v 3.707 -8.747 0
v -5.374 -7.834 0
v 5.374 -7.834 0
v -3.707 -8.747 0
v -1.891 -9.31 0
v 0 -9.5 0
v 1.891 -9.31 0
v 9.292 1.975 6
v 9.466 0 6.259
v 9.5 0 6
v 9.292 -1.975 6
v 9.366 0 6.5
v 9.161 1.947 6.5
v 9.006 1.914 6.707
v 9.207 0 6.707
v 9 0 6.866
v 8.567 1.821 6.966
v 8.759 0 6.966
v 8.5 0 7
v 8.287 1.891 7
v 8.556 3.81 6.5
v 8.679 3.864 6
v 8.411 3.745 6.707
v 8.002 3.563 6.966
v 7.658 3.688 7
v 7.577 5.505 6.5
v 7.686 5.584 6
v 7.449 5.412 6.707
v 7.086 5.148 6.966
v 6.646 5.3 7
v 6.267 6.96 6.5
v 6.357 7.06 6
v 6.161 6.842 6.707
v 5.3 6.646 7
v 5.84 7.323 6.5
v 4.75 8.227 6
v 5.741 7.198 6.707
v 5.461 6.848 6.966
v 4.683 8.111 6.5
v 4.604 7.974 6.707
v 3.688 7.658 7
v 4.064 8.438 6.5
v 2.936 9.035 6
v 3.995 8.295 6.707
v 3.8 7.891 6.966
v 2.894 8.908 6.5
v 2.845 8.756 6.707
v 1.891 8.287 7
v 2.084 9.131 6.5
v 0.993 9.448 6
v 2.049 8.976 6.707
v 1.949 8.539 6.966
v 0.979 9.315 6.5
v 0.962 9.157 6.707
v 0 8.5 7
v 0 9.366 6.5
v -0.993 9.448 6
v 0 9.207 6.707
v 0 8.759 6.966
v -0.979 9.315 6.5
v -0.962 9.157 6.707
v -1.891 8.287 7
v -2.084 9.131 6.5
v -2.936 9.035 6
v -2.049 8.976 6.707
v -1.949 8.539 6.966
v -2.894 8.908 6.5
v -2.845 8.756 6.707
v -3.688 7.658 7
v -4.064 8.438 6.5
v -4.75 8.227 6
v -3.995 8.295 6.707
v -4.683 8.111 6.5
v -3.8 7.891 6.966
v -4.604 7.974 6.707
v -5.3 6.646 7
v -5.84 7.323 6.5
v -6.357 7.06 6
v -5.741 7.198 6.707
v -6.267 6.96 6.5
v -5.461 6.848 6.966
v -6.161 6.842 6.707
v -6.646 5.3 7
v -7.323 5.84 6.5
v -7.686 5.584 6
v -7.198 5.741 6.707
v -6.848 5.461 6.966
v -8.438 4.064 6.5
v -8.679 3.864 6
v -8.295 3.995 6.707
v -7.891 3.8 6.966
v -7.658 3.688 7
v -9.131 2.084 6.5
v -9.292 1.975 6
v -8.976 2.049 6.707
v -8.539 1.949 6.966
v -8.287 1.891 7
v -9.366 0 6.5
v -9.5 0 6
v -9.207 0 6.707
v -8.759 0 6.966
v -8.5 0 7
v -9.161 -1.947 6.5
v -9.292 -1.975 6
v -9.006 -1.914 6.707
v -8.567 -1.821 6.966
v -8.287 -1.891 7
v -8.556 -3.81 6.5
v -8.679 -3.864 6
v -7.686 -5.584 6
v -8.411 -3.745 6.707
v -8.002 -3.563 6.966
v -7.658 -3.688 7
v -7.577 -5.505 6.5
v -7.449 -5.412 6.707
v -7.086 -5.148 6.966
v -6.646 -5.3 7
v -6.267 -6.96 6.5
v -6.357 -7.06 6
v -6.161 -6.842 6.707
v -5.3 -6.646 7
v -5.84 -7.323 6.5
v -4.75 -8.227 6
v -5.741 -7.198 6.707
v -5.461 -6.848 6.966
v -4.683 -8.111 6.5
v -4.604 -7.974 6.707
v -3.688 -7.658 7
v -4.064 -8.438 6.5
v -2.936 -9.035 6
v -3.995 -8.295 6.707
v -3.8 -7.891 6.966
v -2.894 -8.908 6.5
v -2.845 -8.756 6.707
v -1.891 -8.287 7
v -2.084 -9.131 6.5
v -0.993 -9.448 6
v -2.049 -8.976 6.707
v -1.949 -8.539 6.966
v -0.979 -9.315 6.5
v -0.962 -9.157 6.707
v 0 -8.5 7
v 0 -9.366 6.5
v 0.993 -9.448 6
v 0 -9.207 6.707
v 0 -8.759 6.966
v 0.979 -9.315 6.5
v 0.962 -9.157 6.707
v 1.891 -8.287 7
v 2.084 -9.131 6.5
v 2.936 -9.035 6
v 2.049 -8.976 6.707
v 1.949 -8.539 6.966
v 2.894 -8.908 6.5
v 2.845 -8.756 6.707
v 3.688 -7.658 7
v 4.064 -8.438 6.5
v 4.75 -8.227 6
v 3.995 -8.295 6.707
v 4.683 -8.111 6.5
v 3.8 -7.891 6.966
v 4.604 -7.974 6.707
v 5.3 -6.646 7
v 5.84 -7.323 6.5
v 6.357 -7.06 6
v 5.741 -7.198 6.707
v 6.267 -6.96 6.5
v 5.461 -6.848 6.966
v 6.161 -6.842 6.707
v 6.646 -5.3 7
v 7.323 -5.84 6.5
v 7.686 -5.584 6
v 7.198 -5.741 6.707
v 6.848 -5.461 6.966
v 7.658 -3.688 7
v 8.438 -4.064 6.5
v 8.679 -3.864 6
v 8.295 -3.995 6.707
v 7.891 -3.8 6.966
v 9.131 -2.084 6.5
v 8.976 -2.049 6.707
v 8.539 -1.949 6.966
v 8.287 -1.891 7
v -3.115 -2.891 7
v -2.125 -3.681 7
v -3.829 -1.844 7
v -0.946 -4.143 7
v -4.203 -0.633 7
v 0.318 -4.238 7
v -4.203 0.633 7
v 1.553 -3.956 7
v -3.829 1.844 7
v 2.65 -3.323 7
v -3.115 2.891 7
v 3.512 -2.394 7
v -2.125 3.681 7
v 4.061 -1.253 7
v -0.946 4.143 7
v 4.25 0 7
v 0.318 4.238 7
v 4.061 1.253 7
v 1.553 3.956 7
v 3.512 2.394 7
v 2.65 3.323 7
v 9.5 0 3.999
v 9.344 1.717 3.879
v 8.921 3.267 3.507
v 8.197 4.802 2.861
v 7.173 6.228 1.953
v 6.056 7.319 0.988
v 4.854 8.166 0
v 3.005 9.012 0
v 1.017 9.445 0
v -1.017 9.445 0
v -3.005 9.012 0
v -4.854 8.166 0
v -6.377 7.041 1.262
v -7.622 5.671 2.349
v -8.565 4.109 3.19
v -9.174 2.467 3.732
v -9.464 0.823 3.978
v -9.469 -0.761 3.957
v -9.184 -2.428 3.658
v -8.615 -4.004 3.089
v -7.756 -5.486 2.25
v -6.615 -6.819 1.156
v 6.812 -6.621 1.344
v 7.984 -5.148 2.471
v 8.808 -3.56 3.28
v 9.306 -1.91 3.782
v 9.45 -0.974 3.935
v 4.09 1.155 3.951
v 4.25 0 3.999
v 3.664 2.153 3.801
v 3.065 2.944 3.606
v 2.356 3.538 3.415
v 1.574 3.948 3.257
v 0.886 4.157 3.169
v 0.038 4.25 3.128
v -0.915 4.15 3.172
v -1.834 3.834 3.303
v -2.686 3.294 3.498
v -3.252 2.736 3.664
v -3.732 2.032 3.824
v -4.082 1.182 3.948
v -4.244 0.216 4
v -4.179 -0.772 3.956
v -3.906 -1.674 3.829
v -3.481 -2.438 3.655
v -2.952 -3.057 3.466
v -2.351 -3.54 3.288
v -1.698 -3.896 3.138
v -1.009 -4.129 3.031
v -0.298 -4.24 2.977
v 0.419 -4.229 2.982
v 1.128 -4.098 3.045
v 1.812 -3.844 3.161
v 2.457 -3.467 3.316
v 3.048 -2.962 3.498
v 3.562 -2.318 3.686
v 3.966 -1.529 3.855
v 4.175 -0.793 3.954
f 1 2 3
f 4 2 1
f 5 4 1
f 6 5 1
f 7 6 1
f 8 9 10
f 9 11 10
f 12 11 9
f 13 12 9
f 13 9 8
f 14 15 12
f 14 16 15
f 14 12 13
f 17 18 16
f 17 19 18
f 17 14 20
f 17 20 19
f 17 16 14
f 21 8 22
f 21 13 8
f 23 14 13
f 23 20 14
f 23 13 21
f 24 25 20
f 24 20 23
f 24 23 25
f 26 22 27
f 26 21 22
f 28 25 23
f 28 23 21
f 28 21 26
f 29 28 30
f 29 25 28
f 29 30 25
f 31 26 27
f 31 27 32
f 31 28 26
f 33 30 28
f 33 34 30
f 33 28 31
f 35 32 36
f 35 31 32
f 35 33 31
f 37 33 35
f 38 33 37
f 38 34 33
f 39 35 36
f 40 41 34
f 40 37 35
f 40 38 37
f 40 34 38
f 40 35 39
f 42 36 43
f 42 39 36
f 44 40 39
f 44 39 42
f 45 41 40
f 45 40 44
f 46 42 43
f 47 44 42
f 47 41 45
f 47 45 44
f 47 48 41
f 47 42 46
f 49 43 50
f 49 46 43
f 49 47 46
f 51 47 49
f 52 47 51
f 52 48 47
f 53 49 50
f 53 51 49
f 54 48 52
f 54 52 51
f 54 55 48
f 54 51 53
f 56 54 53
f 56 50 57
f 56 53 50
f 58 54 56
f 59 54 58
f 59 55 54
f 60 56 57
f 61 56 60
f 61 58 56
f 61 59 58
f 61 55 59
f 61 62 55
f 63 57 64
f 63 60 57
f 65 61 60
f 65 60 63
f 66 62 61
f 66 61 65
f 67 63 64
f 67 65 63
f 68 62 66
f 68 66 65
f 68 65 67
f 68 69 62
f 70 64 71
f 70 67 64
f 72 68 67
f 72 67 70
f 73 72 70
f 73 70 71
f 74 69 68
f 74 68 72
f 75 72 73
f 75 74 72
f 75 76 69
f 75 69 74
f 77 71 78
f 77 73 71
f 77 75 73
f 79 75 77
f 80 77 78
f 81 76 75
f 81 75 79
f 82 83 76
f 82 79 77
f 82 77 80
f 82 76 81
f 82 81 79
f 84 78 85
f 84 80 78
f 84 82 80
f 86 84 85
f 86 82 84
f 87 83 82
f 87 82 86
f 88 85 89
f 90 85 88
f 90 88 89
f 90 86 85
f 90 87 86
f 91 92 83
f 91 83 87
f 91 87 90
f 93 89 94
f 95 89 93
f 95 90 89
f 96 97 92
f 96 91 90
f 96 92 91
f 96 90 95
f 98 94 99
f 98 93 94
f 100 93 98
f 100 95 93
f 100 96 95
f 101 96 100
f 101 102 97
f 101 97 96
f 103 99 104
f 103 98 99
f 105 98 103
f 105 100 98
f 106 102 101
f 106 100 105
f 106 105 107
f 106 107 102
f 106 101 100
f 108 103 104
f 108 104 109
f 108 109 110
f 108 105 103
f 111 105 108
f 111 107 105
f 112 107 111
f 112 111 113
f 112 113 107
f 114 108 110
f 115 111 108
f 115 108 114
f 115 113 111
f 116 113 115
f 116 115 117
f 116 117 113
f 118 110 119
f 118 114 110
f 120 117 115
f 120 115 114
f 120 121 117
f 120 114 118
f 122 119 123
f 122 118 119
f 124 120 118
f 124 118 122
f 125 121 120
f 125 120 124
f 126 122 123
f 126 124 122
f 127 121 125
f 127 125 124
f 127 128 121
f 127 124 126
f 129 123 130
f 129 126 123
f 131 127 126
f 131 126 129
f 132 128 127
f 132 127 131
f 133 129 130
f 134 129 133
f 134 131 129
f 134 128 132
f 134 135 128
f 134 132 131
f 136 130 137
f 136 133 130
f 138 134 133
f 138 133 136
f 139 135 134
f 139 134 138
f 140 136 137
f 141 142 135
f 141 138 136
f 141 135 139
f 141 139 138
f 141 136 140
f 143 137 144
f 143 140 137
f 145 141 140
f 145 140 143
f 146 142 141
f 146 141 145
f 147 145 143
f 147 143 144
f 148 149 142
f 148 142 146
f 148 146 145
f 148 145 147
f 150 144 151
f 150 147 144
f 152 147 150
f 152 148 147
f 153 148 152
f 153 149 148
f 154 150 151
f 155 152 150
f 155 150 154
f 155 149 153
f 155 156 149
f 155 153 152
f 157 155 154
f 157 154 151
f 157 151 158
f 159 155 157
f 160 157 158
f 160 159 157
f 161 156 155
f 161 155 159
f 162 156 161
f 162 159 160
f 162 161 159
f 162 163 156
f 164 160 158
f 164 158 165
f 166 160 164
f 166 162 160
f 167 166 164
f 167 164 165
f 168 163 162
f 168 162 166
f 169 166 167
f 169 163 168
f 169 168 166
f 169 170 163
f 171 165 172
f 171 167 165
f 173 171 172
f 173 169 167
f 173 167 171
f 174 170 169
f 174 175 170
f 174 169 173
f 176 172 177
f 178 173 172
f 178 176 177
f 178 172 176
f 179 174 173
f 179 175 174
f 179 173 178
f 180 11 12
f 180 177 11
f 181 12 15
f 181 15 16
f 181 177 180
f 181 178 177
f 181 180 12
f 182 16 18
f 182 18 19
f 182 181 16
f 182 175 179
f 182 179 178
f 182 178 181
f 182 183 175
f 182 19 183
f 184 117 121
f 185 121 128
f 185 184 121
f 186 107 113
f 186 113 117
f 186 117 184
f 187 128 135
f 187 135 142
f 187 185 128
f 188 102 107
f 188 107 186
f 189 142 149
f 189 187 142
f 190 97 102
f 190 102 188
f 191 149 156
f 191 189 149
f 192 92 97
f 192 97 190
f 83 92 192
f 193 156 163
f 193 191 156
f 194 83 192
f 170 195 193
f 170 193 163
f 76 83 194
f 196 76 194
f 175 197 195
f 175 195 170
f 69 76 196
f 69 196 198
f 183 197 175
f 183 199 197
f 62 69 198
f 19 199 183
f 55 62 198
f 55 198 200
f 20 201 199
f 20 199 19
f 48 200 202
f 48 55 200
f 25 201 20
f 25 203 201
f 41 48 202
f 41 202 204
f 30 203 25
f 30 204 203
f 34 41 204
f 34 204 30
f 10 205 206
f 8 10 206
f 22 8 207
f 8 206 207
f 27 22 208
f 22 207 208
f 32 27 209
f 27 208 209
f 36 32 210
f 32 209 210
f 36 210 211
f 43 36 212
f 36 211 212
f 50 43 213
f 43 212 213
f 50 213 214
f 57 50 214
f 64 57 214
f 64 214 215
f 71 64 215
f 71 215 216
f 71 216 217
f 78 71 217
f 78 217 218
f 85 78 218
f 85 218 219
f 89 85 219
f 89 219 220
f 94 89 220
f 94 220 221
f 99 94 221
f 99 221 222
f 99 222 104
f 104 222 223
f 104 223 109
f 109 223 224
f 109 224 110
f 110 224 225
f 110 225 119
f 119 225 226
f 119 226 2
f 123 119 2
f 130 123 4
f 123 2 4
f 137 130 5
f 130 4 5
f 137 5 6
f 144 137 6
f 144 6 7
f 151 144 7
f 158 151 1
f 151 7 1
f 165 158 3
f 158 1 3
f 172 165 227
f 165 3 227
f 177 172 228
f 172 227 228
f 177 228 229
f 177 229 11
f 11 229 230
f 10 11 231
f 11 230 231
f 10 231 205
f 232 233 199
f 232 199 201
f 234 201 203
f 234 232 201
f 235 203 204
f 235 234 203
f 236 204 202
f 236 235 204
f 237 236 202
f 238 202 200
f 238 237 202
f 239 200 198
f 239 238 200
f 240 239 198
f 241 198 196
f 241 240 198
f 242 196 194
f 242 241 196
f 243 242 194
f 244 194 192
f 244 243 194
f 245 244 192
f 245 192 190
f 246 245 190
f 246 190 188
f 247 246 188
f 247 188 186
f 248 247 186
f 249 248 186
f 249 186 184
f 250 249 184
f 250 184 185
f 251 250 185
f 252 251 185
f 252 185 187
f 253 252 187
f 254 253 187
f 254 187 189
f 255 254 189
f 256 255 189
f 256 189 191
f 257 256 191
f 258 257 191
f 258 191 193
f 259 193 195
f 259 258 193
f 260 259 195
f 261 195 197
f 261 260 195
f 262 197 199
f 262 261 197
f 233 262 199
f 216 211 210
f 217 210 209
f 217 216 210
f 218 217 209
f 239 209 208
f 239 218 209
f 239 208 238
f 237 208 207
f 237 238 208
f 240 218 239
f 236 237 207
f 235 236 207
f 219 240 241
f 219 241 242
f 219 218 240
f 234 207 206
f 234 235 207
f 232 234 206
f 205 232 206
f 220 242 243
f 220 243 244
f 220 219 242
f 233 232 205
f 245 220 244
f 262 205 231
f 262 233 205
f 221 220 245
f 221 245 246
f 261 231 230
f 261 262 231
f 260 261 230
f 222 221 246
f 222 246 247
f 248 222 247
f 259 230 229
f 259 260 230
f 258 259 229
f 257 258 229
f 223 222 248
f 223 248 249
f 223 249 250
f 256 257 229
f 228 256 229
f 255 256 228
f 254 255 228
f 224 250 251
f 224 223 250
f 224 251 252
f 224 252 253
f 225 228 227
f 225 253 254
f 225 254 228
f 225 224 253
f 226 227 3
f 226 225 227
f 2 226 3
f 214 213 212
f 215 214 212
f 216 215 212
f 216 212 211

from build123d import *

# Parameters (mm, degrees)
SKETCH_1_R               = 9.5
SKETCH_1_R_2             = 4.25
EXTRUDE_1_DEPTH          = 7
CUT_EXTRUDE_1_DEPTH      = 16.149257408
CUT_EXTRUDE_1_DEPTH_BACK = 16.149257408
SKETCH_3_R               = 10
FILLET_1_R               = 1


with BuildPart() as part:
    # Эскиз1 → Бобышка-Вытянуть1 (new body)
    with BuildSketch(Plane.XY):
        Circle(SKETCH_1_R)
        Circle(SKETCH_1_R_2, mode=Mode.SUBTRACT)
    extrude(amount=EXTRUDE_1_DEPTH)

    # Эскиз3 → Вырез-Вытянуть1 (cut, two sides: drawn at the far end of the back side and taken through both)
    with BuildSketch(Plane(origin=(0, 0, 0), x_dir=(0, 0, -1), z_dir=(1, 0, 0)).offset(-CUT_EXTRUDE_1_DEPTH_BACK)):
        with Locations((6, 0.166135782)):
            Circle(SKETCH_3_R)
    extrude(amount=CUT_EXTRUDE_1_DEPTH + CUT_EXTRUDE_1_DEPTH_BACK, mode=Mode.SUBTRACT)

    # Скругление1
    fillet_1_edges = [part.edges().sort_by_distance(p)[0] for p in [
        (-9.5, 0, 7),
    ]]
    fillet(fillet_1_edges, radius=FILLET_1_R)


solid = part.part
